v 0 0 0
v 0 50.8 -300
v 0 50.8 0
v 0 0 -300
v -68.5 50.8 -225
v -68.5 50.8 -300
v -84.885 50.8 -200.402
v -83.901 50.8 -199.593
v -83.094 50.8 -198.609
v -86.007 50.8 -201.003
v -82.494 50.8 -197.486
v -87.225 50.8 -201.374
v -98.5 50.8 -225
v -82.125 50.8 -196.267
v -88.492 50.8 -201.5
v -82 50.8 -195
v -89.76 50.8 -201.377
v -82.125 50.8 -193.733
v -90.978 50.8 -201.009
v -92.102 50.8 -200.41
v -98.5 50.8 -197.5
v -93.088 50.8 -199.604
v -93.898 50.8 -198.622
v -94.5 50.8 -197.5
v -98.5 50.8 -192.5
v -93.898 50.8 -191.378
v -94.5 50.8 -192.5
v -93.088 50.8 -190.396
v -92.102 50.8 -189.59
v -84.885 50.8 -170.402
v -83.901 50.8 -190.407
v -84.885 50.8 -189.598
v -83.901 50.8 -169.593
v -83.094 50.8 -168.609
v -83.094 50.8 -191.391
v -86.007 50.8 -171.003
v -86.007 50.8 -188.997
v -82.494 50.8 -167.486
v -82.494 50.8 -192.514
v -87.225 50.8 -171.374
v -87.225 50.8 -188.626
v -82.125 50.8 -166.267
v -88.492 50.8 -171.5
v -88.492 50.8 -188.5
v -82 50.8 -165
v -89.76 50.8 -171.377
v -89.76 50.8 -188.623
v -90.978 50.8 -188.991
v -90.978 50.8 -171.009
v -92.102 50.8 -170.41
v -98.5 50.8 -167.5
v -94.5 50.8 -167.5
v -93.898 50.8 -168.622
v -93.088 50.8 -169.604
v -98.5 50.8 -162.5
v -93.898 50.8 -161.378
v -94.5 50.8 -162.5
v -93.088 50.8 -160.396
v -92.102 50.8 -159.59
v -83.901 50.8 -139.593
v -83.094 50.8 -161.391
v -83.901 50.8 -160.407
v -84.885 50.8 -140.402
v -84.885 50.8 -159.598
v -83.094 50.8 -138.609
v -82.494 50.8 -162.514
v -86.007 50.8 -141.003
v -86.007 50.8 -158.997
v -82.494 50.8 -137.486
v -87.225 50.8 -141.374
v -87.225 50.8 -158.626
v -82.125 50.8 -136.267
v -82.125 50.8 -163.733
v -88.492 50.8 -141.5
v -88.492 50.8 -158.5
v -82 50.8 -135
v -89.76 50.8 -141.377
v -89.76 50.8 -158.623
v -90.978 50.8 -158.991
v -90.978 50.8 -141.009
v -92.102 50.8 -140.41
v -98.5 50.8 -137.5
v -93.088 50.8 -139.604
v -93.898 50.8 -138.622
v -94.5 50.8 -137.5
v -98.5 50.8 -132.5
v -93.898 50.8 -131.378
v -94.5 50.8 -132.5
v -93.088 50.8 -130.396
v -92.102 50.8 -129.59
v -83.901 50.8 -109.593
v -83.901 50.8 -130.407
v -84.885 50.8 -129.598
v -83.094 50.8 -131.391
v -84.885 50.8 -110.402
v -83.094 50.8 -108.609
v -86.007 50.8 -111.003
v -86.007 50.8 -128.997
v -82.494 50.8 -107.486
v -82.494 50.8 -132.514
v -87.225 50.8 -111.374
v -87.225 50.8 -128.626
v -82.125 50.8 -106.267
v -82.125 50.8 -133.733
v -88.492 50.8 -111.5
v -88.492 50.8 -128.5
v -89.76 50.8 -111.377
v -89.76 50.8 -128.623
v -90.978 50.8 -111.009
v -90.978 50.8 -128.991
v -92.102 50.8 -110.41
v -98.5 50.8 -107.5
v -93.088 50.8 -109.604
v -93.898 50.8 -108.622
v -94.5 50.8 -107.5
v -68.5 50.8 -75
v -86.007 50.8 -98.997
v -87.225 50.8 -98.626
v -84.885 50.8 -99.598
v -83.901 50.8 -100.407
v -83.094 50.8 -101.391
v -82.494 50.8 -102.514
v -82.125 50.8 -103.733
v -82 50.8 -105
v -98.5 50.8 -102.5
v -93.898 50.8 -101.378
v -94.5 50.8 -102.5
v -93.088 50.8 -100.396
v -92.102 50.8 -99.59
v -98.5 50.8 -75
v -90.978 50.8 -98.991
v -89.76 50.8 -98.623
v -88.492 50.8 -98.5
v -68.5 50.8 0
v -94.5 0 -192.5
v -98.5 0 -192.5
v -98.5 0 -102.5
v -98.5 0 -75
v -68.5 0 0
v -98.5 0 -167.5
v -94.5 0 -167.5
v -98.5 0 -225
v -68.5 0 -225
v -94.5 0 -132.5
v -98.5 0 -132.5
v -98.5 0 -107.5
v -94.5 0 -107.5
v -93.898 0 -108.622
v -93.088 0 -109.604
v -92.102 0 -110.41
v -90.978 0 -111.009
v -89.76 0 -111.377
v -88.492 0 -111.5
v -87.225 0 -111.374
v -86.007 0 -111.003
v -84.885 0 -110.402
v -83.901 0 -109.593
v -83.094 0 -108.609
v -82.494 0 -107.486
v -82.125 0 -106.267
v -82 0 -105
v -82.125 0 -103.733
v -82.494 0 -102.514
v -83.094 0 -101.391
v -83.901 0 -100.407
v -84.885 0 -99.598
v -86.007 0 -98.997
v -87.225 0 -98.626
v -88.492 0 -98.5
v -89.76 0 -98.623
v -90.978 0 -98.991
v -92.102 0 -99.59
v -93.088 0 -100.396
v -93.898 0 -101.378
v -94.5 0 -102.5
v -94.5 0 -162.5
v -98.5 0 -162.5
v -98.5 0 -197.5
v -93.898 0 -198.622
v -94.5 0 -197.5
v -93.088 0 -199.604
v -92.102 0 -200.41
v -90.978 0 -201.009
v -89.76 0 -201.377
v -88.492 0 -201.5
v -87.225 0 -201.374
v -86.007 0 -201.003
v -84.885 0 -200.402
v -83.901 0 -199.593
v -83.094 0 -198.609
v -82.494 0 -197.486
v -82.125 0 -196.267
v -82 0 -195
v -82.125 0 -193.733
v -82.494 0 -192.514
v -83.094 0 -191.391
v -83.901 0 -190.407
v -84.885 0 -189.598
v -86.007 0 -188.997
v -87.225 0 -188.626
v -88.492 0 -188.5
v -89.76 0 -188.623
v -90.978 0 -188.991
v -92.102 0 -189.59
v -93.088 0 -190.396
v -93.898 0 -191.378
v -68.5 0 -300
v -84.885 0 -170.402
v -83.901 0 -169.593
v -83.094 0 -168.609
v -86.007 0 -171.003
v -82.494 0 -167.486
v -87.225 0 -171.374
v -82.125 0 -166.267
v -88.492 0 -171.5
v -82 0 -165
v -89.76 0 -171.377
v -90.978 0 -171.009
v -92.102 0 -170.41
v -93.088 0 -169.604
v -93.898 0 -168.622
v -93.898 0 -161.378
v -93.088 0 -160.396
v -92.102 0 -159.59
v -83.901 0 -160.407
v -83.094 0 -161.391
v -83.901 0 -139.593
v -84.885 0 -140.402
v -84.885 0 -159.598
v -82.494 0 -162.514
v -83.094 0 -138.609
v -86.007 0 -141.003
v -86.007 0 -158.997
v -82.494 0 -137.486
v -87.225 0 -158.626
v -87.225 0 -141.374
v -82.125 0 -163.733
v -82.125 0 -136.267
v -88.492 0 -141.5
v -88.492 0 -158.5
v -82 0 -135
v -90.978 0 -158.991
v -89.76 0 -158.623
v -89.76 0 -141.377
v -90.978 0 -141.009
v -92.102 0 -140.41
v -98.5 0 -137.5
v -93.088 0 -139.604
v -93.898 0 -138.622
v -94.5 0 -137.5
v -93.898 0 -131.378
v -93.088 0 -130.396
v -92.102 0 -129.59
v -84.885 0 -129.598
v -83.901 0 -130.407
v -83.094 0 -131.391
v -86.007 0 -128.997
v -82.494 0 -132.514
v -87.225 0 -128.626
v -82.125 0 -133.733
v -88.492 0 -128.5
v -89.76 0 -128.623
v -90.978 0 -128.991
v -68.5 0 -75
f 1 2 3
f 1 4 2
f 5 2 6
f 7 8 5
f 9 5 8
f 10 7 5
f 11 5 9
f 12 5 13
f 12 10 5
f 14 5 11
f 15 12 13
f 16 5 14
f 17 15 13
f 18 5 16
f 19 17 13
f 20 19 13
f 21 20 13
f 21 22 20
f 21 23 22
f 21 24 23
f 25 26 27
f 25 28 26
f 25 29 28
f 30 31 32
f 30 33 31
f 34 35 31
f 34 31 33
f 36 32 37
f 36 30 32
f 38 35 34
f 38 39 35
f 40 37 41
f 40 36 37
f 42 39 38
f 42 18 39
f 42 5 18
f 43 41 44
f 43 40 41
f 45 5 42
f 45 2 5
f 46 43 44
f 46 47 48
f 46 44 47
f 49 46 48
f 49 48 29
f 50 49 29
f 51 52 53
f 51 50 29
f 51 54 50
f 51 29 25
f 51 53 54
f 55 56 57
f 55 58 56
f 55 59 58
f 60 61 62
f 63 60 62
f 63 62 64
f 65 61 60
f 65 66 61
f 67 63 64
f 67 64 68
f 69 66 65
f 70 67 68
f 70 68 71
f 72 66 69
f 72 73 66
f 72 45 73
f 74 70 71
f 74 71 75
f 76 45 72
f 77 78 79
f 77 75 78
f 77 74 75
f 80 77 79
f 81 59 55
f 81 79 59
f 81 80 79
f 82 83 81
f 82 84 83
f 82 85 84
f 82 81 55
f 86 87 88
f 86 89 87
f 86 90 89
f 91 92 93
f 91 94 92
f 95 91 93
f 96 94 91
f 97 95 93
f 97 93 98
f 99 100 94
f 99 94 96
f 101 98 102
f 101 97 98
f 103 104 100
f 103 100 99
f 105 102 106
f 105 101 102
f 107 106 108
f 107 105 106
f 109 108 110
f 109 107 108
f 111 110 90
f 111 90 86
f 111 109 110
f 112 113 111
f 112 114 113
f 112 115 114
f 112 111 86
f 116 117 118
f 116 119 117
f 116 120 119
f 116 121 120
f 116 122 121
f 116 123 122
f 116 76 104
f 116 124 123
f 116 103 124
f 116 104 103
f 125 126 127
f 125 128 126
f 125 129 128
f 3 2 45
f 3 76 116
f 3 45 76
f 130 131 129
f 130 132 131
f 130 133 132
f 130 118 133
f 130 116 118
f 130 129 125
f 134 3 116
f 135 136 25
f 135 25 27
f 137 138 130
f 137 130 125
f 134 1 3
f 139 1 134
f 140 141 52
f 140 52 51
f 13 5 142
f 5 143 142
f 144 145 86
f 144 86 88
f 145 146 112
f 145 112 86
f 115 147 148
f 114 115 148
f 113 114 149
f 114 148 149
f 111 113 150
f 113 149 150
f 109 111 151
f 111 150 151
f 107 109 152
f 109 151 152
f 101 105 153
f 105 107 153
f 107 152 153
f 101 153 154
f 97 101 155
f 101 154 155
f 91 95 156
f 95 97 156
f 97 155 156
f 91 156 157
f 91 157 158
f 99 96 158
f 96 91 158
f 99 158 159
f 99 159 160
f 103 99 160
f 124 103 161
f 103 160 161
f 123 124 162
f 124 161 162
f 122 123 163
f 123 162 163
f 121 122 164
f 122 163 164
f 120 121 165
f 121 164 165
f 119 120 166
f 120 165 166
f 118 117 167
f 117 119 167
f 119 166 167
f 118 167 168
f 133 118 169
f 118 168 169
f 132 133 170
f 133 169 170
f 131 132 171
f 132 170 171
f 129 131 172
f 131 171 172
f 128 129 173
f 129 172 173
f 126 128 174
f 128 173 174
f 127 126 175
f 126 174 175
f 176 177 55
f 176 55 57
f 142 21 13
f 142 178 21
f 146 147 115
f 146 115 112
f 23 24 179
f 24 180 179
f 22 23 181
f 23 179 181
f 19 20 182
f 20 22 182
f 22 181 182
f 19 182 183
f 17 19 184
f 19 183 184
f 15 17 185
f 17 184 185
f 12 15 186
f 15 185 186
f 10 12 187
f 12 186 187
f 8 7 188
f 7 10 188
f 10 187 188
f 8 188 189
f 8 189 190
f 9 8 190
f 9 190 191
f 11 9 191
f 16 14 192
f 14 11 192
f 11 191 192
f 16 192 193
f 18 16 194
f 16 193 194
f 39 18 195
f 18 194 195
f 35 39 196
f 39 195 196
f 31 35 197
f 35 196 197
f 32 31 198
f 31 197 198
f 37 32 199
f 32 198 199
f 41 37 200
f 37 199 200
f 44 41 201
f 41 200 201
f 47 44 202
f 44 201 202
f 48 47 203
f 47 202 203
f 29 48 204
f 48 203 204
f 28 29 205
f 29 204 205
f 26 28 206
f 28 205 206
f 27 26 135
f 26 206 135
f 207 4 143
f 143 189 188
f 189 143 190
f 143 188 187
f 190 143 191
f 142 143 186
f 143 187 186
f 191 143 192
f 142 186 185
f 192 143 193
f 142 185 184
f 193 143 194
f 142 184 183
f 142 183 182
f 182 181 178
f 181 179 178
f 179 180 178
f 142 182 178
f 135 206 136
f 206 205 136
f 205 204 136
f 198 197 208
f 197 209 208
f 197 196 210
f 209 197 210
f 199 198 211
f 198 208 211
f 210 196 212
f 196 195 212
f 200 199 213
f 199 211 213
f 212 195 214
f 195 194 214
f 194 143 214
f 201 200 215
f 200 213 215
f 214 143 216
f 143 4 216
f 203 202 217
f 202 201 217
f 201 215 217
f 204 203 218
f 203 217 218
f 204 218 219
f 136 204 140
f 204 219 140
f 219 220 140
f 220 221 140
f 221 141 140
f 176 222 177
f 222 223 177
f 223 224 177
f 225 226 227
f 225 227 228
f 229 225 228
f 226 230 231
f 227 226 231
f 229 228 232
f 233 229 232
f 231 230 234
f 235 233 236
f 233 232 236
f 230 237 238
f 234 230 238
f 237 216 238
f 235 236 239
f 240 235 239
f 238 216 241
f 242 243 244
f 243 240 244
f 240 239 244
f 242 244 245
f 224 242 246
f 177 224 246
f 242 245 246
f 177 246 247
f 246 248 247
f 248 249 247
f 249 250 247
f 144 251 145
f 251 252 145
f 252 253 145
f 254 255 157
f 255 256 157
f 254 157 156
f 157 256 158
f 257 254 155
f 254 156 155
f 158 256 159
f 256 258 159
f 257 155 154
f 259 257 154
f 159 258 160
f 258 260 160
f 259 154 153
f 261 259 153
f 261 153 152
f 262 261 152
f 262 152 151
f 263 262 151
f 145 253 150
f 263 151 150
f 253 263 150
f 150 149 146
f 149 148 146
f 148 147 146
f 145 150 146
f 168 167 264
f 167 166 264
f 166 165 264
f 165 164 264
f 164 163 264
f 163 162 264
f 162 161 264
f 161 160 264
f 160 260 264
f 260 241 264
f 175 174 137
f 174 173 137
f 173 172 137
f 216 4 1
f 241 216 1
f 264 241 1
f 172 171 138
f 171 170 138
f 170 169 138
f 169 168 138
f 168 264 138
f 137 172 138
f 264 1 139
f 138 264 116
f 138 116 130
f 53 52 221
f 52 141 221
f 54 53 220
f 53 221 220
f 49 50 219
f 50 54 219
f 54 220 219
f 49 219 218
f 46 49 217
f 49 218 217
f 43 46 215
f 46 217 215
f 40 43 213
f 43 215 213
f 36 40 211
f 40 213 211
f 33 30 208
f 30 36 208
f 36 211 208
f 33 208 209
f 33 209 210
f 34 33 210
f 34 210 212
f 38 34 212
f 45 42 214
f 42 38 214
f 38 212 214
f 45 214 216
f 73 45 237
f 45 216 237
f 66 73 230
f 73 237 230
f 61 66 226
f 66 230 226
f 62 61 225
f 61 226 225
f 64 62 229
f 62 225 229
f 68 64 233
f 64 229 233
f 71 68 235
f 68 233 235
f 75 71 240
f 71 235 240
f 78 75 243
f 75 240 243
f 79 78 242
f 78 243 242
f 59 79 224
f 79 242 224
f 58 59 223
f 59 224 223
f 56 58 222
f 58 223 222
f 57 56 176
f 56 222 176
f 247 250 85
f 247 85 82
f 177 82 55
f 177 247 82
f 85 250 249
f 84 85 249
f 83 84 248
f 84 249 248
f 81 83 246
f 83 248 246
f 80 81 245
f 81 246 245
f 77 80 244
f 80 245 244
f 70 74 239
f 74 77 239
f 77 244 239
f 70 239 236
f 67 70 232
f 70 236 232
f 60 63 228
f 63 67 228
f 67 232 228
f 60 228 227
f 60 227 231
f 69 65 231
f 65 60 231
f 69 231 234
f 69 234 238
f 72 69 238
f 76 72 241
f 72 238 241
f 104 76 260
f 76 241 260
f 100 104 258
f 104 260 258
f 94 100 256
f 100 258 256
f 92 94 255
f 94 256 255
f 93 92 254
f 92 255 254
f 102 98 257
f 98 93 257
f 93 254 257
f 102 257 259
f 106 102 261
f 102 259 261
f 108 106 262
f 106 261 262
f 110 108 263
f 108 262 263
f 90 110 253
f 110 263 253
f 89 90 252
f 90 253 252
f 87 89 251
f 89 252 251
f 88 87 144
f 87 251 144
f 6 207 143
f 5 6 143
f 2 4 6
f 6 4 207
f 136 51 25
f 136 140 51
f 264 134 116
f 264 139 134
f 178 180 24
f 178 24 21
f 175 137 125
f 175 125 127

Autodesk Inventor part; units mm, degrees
ref_plane "YZ Plane" through (0, 0, 0) normal (1, 0, 0) x (0, 1, 0)
ref_plane "XZ Plane" through (0, 0, 0) normal (0, 1, 0) x (-1, 0, 0)
ref_plane "XY Plane" through (0, 0, 0) normal (0, 0, 1) x (1, 0, 0)
sketch "Sketch3" plane through (0, 0, 0) normal (0, 1, 0) x (-1, 0, 0)
  line L0 (0, -300) -> (0, 0)
  line L1 (68.5, 0) -> (68.5, -75)
  line L2 (68.5, -75) -> (98.5, -75)
  line L3 (68.5, -300) -> (68.5, -225)
  line L4 (68.5, -225) -> (98.5, -225)
  line L5 (0, 0) -> (68.5, 0)
  line L6 (68.5, 0) -> (68.5, -75)
  line L7 (68.5, -75) -> (98.5, -75)
  line L8 (98.5, -75) -> (98.5, -225)
  line L9 (0, -300) -> (68.5, -300)
  circle A0 centre (88.5, -105) radius 6.5
  circle A1 centre (88.5, -135) radius 6.5
  circle A2 centre (88.5, -165) radius 6.5
  circle A3 centre (88.5, -195) radius 6.5
  dimension "d44" = 30
  dimension "d48" = 13
  dimension "d49" = 30
  dimension "d50" = 10
  dimension "d56" = 30
  dimension "d70" = 150
  dimension "d71" = 75
  dimension "d72" = 75
  dimension "d73" = 68.5
  dimension "d74" = 68.5
  dimension "d75" = 68.5
  dimension "d76" = 30
  dimension "d77" = 150
  dimension "d78" = 90
  dimension "d79" = 90
extrude "Extrusion1" add sketch "Sketch3" along normal blind 50.8
sketch "Sketch6" plane through (0, 50.8, 0) normal (0, 1, 0) x (1, 0, 0)
  line L0 (-98.5, 225) -> (-98.5, 75) projected
  line L1 (-98.5, 102.5) -> (-93.5, 102.5)
  line L2 (-93.5, 102.5) -> (-93.5, 107.5)
  line L3 (-93.5, 107.5) -> (-98.5, 107.5)
  line L4 (-98.5, 107.5) -> (-98.5, 102.5)
  circle A0 centre (-88.5, 105) radius 6.5 projected
  line L5 (-93.5, 132.5) -> (-93.5, 137.5)
  line L6 (-93.5, 137.5) -> (-98.5, 137.5)
  line L7 (-98.5, 137.5) -> (-98.5, 132.5)
  line L8 (-98.5, 132.5) -> (-93.5, 132.5)
  line L9 (-93.5, 162.5) -> (-93.5, 167.5)
  line L10 (-93.5, 167.5) -> (-98.5, 167.5)
  line L11 (-98.5, 167.5) -> (-98.5, 162.5)
  line L12 (-98.5, 162.5) -> (-93.5, 162.5)
  line L13 (-93.5, 192.5) -> (-93.5, 197.5)
  line L14 (-93.5, 197.5) -> (-98.5, 197.5)
  line L15 (-98.5, 197.5) -> (-98.5, 192.5)
  line L16 (-98.5, 192.5) -> (-93.5, 192.5)
  point P0 (0, 0)
  dimension "d58" = 5
  dimension "d59" = 5
  dimension "d60" = 2.5
  dimension "d66" = 30
extrude "Extrusion3" cut sketch "Sketch6" against normal blind 50.8 contours L14 L13 L16 L0 | L3 A0 L1 L0 | L6 L5 L8 L0 | L10 L9 L12 L0 | L3 L2 L1 A0 picked at (-94, 105)
properties part number "PiezaInferior"
